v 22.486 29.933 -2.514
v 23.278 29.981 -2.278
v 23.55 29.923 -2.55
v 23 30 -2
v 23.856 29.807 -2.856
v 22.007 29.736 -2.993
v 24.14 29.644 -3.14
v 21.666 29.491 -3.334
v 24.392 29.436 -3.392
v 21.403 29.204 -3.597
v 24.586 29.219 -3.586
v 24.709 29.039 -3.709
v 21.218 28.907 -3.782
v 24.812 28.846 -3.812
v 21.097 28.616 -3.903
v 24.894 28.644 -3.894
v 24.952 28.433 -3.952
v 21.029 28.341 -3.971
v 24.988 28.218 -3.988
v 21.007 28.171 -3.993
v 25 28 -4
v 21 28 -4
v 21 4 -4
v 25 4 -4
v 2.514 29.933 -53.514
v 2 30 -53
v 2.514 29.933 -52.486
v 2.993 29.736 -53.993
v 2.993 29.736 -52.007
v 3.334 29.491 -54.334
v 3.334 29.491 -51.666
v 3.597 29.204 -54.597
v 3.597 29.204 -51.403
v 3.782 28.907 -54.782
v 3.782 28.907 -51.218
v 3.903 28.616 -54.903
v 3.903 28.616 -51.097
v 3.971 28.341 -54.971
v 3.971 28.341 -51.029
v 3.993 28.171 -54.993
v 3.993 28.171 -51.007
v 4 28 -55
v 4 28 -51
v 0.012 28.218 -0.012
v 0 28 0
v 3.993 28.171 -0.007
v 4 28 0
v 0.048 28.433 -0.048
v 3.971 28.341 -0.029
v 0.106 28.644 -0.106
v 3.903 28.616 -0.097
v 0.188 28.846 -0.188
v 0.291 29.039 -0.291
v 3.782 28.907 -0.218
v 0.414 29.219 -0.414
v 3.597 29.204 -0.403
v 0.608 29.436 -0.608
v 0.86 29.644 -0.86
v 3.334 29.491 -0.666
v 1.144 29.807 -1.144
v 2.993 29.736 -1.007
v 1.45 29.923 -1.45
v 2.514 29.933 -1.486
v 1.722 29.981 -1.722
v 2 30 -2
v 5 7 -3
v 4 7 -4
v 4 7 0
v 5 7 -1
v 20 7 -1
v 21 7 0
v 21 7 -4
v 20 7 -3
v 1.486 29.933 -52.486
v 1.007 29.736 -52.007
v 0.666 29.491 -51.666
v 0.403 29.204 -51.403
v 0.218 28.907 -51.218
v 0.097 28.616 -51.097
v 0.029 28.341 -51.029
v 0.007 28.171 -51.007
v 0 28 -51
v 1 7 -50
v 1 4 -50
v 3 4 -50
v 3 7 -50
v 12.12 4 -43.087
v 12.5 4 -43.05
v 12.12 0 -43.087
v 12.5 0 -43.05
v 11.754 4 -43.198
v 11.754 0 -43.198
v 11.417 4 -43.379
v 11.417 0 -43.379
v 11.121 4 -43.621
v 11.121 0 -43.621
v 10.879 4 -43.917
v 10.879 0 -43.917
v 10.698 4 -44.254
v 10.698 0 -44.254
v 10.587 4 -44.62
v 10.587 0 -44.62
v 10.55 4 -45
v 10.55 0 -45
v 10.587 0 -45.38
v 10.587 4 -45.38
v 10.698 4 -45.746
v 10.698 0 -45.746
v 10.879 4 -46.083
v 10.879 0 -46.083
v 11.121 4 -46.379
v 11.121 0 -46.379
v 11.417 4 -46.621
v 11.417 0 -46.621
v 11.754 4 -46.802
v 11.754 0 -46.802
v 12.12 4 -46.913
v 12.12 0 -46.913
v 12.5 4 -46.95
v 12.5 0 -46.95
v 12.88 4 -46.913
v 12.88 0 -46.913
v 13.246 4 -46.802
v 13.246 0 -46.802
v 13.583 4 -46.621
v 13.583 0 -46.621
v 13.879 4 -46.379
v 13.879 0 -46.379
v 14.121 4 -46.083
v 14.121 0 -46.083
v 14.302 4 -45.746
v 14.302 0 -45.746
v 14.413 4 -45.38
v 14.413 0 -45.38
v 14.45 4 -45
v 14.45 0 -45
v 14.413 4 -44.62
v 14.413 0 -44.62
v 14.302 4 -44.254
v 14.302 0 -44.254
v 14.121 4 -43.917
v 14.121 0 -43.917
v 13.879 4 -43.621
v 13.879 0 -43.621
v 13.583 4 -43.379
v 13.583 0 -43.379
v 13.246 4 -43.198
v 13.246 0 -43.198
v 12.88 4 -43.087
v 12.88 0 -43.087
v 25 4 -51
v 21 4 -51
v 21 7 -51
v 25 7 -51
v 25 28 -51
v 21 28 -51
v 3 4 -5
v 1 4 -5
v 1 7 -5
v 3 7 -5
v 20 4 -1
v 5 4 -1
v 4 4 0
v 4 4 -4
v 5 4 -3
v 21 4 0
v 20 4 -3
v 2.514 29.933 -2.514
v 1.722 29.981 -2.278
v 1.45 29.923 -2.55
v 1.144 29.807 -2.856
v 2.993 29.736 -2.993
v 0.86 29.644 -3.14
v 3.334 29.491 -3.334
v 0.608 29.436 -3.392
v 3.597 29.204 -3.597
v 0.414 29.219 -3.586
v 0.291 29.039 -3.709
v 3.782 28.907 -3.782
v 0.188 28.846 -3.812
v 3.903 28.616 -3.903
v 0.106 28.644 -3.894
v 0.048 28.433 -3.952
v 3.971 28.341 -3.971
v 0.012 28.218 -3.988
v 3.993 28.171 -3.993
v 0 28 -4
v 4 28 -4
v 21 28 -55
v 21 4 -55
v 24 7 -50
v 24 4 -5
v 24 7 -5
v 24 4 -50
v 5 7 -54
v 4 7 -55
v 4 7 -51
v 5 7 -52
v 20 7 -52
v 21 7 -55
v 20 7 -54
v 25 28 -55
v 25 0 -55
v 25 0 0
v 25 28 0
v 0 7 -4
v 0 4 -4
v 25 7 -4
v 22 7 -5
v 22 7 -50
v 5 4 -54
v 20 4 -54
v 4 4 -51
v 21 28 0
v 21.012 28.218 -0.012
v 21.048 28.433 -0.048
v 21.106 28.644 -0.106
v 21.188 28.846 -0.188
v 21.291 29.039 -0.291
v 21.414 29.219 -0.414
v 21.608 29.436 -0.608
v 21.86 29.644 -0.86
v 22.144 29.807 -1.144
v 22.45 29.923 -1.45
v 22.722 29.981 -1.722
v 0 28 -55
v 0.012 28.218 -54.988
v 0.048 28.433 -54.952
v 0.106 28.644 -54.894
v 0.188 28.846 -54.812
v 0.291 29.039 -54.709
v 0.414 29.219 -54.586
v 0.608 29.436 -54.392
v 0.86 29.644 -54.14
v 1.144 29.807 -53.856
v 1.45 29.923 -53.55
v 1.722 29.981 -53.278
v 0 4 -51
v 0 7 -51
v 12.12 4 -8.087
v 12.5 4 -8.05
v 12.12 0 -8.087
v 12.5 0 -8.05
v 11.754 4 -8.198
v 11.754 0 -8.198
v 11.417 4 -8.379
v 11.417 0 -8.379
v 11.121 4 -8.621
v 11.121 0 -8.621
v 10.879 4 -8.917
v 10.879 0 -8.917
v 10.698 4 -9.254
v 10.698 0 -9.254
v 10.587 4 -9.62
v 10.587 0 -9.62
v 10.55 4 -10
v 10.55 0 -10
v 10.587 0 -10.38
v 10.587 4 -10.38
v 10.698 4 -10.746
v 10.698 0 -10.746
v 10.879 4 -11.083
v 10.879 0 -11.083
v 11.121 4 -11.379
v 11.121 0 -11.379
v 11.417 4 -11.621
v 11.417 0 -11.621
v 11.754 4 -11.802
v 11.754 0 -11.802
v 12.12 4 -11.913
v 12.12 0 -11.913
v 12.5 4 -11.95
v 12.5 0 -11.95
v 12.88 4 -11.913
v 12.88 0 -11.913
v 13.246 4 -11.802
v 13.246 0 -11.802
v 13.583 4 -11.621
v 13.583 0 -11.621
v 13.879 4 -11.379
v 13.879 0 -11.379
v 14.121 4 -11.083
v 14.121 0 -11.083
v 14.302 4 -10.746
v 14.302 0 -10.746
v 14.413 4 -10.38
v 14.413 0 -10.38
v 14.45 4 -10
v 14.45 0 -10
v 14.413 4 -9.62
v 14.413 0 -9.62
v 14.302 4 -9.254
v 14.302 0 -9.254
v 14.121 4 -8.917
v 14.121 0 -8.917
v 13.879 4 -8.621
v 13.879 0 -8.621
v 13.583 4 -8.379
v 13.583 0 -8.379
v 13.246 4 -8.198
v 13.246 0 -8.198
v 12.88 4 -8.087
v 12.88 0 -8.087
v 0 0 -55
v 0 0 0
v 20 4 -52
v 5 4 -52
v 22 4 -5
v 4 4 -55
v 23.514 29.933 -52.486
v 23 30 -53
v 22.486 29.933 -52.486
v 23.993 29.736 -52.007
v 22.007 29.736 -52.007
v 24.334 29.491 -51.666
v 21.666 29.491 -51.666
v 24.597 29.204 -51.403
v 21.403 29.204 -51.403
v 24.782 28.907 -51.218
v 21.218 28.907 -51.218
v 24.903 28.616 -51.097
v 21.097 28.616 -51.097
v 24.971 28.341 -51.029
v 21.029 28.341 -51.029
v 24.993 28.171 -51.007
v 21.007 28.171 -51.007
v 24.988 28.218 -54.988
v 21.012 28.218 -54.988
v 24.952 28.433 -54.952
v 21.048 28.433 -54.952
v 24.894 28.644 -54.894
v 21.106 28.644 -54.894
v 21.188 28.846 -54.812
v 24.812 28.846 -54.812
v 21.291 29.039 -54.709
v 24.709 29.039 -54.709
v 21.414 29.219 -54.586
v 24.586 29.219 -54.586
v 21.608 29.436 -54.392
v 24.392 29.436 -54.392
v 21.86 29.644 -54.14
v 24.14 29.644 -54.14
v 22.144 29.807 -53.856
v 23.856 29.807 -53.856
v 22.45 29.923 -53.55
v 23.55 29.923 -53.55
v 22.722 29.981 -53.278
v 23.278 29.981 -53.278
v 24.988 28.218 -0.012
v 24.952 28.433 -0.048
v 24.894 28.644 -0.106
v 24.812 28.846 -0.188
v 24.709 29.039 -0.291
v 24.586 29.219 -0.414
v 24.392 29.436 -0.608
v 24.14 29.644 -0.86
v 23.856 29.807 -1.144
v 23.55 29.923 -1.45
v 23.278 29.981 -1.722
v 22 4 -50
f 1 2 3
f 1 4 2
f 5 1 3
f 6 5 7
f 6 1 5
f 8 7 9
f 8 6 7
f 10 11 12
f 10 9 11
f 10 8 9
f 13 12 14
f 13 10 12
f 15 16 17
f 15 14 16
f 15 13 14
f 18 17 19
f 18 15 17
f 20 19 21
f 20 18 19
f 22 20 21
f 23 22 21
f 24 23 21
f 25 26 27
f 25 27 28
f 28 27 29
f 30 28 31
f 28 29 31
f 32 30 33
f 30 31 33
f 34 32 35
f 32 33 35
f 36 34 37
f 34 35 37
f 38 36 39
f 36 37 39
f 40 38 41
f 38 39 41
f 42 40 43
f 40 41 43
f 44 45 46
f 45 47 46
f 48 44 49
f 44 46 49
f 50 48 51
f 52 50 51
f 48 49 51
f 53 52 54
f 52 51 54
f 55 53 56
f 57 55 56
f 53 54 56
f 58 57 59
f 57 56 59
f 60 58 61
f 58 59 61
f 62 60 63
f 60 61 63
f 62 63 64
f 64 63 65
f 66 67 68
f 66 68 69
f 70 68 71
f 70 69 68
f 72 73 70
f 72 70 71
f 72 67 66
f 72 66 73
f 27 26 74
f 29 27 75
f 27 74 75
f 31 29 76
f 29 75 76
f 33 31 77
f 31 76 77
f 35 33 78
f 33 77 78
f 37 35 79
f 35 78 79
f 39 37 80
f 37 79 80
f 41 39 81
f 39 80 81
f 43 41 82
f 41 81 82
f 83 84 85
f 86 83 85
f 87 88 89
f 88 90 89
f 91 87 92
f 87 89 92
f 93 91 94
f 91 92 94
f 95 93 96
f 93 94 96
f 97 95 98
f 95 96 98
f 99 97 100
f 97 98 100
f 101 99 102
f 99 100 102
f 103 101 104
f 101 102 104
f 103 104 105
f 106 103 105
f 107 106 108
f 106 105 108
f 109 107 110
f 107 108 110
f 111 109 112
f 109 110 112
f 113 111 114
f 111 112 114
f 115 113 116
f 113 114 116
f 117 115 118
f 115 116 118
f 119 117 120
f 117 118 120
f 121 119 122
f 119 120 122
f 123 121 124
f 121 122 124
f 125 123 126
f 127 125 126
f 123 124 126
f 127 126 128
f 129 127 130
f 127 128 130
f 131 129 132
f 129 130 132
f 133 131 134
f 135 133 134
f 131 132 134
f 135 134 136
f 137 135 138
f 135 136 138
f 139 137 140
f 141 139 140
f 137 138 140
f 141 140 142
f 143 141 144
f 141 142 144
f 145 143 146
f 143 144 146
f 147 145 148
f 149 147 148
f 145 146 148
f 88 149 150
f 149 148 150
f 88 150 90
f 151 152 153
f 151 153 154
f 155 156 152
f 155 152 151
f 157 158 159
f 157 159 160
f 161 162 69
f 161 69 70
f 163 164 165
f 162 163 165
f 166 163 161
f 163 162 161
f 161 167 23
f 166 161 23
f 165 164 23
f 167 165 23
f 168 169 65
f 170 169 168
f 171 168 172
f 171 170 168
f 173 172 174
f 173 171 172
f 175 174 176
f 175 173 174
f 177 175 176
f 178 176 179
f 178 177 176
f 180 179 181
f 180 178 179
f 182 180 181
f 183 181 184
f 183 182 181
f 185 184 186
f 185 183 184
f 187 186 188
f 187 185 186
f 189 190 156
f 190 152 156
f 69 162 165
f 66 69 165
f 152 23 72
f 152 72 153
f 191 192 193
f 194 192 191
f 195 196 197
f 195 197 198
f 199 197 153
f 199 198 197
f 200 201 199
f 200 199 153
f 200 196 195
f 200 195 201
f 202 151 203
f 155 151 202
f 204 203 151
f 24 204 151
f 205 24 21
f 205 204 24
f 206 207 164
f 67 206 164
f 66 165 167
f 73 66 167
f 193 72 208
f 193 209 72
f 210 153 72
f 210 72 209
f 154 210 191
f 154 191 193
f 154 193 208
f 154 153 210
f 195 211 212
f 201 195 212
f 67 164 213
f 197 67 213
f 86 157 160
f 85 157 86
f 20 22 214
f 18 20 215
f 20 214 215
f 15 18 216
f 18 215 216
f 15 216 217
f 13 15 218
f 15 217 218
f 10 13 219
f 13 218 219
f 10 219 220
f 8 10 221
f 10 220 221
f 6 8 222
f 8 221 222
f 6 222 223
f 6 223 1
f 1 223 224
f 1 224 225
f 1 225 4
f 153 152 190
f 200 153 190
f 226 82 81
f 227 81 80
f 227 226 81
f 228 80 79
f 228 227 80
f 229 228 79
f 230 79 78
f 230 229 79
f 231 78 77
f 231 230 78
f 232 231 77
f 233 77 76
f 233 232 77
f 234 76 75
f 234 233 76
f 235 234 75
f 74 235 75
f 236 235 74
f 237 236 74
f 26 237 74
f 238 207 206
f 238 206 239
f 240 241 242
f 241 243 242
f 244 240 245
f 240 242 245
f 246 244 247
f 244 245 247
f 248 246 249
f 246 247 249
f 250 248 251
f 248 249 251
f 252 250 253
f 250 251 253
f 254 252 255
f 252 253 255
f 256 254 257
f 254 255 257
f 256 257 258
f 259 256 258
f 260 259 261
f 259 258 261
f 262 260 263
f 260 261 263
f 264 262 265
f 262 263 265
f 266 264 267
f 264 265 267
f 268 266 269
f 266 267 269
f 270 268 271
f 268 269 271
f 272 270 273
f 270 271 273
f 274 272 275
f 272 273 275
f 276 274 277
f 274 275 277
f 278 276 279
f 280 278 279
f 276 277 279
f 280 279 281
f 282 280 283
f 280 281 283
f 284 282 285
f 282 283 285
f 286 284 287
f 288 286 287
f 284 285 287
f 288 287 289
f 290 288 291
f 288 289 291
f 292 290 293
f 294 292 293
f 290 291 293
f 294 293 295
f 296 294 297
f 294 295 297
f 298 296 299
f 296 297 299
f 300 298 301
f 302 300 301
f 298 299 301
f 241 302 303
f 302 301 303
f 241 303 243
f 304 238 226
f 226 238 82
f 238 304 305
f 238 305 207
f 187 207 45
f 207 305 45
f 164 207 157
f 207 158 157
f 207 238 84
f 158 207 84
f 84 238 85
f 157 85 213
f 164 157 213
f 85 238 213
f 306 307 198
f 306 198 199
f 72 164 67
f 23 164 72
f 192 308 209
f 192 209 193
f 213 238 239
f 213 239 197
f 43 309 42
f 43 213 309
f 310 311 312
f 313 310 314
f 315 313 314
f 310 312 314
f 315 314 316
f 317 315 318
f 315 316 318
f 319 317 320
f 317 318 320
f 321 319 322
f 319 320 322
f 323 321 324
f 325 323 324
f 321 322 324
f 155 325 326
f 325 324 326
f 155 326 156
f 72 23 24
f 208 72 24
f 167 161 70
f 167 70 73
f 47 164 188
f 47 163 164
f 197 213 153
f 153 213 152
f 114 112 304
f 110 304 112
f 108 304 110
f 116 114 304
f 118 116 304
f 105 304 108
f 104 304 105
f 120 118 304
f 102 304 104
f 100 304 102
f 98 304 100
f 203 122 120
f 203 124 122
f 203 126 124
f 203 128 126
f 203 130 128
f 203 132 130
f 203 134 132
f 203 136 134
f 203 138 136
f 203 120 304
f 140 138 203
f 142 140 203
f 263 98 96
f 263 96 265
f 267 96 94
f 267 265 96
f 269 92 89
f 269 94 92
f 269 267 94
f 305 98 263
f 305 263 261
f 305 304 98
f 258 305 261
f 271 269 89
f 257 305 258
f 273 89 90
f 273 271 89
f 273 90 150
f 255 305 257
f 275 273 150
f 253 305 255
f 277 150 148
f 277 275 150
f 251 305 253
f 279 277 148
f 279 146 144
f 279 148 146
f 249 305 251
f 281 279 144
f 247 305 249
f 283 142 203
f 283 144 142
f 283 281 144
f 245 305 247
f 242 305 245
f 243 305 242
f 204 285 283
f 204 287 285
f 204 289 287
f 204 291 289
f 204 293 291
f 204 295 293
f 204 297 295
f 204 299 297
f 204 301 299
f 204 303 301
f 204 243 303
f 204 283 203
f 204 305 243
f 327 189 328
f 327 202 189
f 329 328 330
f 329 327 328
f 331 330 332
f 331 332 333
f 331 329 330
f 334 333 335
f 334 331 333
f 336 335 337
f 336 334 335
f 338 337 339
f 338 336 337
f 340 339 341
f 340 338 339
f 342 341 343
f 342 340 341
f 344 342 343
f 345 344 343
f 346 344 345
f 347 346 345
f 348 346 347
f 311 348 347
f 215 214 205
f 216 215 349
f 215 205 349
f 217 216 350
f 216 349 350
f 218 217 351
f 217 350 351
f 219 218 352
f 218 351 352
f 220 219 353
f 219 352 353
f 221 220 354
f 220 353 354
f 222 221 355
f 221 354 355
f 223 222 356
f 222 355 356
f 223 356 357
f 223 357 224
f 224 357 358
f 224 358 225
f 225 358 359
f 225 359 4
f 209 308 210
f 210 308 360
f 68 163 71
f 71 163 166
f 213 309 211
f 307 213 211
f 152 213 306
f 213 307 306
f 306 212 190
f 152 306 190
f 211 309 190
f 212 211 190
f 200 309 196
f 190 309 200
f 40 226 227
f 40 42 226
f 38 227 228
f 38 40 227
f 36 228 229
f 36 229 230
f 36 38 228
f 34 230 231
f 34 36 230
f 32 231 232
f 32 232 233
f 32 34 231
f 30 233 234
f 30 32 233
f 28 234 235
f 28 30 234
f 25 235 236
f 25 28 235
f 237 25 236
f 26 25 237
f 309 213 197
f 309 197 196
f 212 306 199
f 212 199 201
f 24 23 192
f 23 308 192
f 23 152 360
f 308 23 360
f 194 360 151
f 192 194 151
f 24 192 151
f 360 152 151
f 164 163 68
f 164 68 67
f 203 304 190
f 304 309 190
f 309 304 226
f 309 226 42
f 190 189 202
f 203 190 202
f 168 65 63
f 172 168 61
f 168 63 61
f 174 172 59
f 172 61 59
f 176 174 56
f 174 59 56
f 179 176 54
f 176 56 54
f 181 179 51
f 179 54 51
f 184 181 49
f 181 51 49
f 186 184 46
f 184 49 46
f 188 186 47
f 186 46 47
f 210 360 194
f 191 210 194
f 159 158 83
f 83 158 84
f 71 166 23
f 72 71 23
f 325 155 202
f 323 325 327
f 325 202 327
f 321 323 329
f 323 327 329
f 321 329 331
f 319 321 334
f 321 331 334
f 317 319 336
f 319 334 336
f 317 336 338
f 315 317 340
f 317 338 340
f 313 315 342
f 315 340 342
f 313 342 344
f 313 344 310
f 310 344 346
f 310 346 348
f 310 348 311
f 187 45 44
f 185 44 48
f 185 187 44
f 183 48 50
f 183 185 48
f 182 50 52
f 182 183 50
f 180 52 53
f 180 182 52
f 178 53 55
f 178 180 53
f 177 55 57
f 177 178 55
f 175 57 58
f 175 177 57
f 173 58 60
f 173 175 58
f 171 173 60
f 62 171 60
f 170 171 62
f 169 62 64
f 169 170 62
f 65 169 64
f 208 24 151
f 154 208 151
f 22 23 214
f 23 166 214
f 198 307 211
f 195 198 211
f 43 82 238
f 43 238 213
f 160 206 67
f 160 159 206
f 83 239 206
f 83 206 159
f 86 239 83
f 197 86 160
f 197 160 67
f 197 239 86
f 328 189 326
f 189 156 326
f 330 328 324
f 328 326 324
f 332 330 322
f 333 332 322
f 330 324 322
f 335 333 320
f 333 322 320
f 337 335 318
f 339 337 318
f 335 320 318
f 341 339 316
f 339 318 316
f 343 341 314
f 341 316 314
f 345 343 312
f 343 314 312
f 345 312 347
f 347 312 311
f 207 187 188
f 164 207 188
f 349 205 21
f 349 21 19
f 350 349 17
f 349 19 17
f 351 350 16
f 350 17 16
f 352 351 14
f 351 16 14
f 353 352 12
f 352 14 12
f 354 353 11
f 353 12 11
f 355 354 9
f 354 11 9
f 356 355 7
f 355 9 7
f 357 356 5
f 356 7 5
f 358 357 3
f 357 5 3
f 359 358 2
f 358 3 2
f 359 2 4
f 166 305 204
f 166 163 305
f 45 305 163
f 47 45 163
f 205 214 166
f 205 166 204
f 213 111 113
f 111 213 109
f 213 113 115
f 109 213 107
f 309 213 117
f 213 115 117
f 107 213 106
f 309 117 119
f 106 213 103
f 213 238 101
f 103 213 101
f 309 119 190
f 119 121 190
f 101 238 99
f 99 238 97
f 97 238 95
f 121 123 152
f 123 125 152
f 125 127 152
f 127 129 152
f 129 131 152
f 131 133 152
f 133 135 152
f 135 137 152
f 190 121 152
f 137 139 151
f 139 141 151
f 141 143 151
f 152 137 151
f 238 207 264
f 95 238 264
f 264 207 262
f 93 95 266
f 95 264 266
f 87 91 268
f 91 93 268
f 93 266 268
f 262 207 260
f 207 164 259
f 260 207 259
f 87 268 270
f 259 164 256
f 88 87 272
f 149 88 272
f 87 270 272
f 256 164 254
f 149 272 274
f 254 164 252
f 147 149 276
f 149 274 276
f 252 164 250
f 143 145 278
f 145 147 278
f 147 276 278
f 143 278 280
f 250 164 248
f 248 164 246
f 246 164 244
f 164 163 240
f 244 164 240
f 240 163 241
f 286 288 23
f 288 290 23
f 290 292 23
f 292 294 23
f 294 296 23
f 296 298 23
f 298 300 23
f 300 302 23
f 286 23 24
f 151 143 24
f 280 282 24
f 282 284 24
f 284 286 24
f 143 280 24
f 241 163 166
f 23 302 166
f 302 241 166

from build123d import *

# Parameters (mm, degrees)
SKETCH1_W                           = 25
SKETCH1_H                           = 30
BOSS_EXTRUDE2_DEPTH                 = 55
SHELL14_T                           = -4
SHELL15_START                       = 4
SHELL15_OUTLINE_W                   = 26
SHELL15_OUTLINE_H                   = 4
SHELL15_DEPTH                       = 17
EXTRUDE_THIN1_OUTLINE_W             = 4
EXTRUDE_THIN1_OUTLINE_H             = 47
EXTRUDE_THIN1_OUTLINE_W_2           = 2
EXTRUDE_THIN1_OUTLINE_H_2           = 45
EXTRUDE_THIN1_OUTLINE_W_3           = 17
EXTRUDE_THIN1_OUTLINE_H_3           = 4
EXTRUDE_THIN1_OUTLINE_W_4           = 15
EXTRUDE_THIN1_OUTLINE_H_4           = 2
EXTRUDE_THIN1_DEPTH                 = 3
SKETCH20_W                          = 1.95
SKETCH20_H                          = 4
F_6_0_204_DIAMETER_HOLE2_AT_2_COUNT = 2
F_6_0_204_DIAMETER_HOLE2_AT_2_PITCH = 35
FILLET1_R                           = 2


# Read off the part's stored shape, not the designer's step: Shell15, Extrude-Thin1
with BuildPart() as part:
    # Sketch1 → Boss-Extrude2 (new body)
    with BuildSketch(Plane.XY):
        with Locations((12.5, 15)):
            Rectangle(SKETCH1_W, SKETCH1_H)
    extrude(amount=-BOSS_EXTRUDE2_DEPTH)

    # Shell14
    shell14_openings = [part.faces().sort_by_distance(p)[0] for p in [
        (25, 15, -27.5),
        (12.5, 30, -27.5),
        (0, 15, -27.5),
    ]]
    offset(amount=SHELL14_T, openings=shell14_openings, kind=Kind.INTERSECTION)

    # Shell15 outline → Shell15 (cut)
    with BuildSketch(Plane.YZ.offset(SHELL15_START)):
        with Locations((17, -53)):
            Rectangle(SHELL15_OUTLINE_W, SHELL15_OUTLINE_H)
        with Locations((17, -2)):
            Rectangle(SHELL15_OUTLINE_W, SHELL15_OUTLINE_H)
    extrude(amount=SHELL15_DEPTH, mode=Mode.SUBTRACT)

    # Sketch20 → #6 (0.204) Diameter Hole2 (revolve, cut)
    with BuildSketch(Plane(origin=(12.5, 4, -45), x_dir=(0, 0, 1), z_dir=(1, 0, 0))):
        with Locations((0.975, 2)):
            Rectangle(SKETCH20_W, SKETCH20_H)
    f_6_0_204_diameter_hole2 = revolve(axis=Axis((12.5, 10.35, -45), (0, -1, 0)), mode=Mode.SUBTRACT)

    # #6 (0.204) Diameter Hole2 at 2: #6 (0.204) Diameter Hole2 ×2
    with Locations(*[(0, 0, i * F_6_0_204_DIAMETER_HOLE2_AT_2_PITCH) for i in range(1, F_6_0_204_DIAMETER_HOLE2_AT_2_COUNT)]):
        add(f_6_0_204_diameter_hole2, mode=Mode.SUBTRACT)

    # Fillet1
    fillet1_edges = [part.edges().sort_by_distance(p)[0] for p in [
        (25, 30, -2),
        (0, 30, -2),
        (2, 30, -4),
        (2, 30, -51),
        (23, 30, -4),
        (23, 30, -51),
        (23, 30, 0),
        (23, 30, -55),
        (21, 30, -53),
        (4, 30, -53),
        (4, 30, -2),
        (21, 30, -2),
        (2, 30, 0),
        (25, 30, -53),
        (0, 30, -53),
        (2, 30, -55),
    ]]
    fillet(fillet1_edges, radius=FILLET1_R - 0.0001)  # a hair under: the kernel refuses the full size


with BuildPart() as body_2:
    # Extrude-Thin1 outline → Extrude-Thin1 (new body)
    # profile 1 of 4: a face of its own
    with BuildSketch(Plane(origin=(0, 4, 0), x_dir=(1, 0, 0), z_dir=(0, 1, 0))):
        with Locations((23, 27.5)):
            Rectangle(EXTRUDE_THIN1_OUTLINE_W, EXTRUDE_THIN1_OUTLINE_H)
        with Locations((23, 27.5)):
            Rectangle(EXTRUDE_THIN1_OUTLINE_W_2, EXTRUDE_THIN1_OUTLINE_H_2, mode=Mode.SUBTRACT)
    # profile 2 of 4: a face of its own
    with BuildSketch(Plane(origin=(0, 4, 0), x_dir=(1, 0, 0), z_dir=(0, 1, 0))):
        with Locations((12.5, 53)):
            Rectangle(EXTRUDE_THIN1_OUTLINE_W_3, EXTRUDE_THIN1_OUTLINE_H_3)
        with Locations((12.5, 53)):
            Rectangle(EXTRUDE_THIN1_OUTLINE_W_4, EXTRUDE_THIN1_OUTLINE_H_4, mode=Mode.SUBTRACT)
    # profile 3 of 4: a face of its own
    with BuildSketch(Plane(origin=(0, 4, 0), x_dir=(1, 0, 0), z_dir=(0, 1, 0))):
        with Locations((2, 27.5)):
            Rectangle(EXTRUDE_THIN1_OUTLINE_W, EXTRUDE_THIN1_OUTLINE_H)
        with Locations((2, 27.5)):
            Rectangle(EXTRUDE_THIN1_OUTLINE_W_2, EXTRUDE_THIN1_OUTLINE_H_2, mode=Mode.SUBTRACT)
    # profile 4 of 4: a face of its own
    with BuildSketch(Plane(origin=(0, 4, 0), x_dir=(1, 0, 0), z_dir=(0, 1, 0))):
        with Locations((12.5, 2)):
            Rectangle(EXTRUDE_THIN1_OUTLINE_W_3, EXTRUDE_THIN1_OUTLINE_H_3)
        with Locations((12.5, 2)):
            Rectangle(EXTRUDE_THIN1_OUTLINE_W_4, EXTRUDE_THIN1_OUTLINE_H_4, mode=Mode.SUBTRACT)
    extrude(amount=EXTRUDE_THIN1_DEPTH)


solid = Compound([part.part, body_2.part])
